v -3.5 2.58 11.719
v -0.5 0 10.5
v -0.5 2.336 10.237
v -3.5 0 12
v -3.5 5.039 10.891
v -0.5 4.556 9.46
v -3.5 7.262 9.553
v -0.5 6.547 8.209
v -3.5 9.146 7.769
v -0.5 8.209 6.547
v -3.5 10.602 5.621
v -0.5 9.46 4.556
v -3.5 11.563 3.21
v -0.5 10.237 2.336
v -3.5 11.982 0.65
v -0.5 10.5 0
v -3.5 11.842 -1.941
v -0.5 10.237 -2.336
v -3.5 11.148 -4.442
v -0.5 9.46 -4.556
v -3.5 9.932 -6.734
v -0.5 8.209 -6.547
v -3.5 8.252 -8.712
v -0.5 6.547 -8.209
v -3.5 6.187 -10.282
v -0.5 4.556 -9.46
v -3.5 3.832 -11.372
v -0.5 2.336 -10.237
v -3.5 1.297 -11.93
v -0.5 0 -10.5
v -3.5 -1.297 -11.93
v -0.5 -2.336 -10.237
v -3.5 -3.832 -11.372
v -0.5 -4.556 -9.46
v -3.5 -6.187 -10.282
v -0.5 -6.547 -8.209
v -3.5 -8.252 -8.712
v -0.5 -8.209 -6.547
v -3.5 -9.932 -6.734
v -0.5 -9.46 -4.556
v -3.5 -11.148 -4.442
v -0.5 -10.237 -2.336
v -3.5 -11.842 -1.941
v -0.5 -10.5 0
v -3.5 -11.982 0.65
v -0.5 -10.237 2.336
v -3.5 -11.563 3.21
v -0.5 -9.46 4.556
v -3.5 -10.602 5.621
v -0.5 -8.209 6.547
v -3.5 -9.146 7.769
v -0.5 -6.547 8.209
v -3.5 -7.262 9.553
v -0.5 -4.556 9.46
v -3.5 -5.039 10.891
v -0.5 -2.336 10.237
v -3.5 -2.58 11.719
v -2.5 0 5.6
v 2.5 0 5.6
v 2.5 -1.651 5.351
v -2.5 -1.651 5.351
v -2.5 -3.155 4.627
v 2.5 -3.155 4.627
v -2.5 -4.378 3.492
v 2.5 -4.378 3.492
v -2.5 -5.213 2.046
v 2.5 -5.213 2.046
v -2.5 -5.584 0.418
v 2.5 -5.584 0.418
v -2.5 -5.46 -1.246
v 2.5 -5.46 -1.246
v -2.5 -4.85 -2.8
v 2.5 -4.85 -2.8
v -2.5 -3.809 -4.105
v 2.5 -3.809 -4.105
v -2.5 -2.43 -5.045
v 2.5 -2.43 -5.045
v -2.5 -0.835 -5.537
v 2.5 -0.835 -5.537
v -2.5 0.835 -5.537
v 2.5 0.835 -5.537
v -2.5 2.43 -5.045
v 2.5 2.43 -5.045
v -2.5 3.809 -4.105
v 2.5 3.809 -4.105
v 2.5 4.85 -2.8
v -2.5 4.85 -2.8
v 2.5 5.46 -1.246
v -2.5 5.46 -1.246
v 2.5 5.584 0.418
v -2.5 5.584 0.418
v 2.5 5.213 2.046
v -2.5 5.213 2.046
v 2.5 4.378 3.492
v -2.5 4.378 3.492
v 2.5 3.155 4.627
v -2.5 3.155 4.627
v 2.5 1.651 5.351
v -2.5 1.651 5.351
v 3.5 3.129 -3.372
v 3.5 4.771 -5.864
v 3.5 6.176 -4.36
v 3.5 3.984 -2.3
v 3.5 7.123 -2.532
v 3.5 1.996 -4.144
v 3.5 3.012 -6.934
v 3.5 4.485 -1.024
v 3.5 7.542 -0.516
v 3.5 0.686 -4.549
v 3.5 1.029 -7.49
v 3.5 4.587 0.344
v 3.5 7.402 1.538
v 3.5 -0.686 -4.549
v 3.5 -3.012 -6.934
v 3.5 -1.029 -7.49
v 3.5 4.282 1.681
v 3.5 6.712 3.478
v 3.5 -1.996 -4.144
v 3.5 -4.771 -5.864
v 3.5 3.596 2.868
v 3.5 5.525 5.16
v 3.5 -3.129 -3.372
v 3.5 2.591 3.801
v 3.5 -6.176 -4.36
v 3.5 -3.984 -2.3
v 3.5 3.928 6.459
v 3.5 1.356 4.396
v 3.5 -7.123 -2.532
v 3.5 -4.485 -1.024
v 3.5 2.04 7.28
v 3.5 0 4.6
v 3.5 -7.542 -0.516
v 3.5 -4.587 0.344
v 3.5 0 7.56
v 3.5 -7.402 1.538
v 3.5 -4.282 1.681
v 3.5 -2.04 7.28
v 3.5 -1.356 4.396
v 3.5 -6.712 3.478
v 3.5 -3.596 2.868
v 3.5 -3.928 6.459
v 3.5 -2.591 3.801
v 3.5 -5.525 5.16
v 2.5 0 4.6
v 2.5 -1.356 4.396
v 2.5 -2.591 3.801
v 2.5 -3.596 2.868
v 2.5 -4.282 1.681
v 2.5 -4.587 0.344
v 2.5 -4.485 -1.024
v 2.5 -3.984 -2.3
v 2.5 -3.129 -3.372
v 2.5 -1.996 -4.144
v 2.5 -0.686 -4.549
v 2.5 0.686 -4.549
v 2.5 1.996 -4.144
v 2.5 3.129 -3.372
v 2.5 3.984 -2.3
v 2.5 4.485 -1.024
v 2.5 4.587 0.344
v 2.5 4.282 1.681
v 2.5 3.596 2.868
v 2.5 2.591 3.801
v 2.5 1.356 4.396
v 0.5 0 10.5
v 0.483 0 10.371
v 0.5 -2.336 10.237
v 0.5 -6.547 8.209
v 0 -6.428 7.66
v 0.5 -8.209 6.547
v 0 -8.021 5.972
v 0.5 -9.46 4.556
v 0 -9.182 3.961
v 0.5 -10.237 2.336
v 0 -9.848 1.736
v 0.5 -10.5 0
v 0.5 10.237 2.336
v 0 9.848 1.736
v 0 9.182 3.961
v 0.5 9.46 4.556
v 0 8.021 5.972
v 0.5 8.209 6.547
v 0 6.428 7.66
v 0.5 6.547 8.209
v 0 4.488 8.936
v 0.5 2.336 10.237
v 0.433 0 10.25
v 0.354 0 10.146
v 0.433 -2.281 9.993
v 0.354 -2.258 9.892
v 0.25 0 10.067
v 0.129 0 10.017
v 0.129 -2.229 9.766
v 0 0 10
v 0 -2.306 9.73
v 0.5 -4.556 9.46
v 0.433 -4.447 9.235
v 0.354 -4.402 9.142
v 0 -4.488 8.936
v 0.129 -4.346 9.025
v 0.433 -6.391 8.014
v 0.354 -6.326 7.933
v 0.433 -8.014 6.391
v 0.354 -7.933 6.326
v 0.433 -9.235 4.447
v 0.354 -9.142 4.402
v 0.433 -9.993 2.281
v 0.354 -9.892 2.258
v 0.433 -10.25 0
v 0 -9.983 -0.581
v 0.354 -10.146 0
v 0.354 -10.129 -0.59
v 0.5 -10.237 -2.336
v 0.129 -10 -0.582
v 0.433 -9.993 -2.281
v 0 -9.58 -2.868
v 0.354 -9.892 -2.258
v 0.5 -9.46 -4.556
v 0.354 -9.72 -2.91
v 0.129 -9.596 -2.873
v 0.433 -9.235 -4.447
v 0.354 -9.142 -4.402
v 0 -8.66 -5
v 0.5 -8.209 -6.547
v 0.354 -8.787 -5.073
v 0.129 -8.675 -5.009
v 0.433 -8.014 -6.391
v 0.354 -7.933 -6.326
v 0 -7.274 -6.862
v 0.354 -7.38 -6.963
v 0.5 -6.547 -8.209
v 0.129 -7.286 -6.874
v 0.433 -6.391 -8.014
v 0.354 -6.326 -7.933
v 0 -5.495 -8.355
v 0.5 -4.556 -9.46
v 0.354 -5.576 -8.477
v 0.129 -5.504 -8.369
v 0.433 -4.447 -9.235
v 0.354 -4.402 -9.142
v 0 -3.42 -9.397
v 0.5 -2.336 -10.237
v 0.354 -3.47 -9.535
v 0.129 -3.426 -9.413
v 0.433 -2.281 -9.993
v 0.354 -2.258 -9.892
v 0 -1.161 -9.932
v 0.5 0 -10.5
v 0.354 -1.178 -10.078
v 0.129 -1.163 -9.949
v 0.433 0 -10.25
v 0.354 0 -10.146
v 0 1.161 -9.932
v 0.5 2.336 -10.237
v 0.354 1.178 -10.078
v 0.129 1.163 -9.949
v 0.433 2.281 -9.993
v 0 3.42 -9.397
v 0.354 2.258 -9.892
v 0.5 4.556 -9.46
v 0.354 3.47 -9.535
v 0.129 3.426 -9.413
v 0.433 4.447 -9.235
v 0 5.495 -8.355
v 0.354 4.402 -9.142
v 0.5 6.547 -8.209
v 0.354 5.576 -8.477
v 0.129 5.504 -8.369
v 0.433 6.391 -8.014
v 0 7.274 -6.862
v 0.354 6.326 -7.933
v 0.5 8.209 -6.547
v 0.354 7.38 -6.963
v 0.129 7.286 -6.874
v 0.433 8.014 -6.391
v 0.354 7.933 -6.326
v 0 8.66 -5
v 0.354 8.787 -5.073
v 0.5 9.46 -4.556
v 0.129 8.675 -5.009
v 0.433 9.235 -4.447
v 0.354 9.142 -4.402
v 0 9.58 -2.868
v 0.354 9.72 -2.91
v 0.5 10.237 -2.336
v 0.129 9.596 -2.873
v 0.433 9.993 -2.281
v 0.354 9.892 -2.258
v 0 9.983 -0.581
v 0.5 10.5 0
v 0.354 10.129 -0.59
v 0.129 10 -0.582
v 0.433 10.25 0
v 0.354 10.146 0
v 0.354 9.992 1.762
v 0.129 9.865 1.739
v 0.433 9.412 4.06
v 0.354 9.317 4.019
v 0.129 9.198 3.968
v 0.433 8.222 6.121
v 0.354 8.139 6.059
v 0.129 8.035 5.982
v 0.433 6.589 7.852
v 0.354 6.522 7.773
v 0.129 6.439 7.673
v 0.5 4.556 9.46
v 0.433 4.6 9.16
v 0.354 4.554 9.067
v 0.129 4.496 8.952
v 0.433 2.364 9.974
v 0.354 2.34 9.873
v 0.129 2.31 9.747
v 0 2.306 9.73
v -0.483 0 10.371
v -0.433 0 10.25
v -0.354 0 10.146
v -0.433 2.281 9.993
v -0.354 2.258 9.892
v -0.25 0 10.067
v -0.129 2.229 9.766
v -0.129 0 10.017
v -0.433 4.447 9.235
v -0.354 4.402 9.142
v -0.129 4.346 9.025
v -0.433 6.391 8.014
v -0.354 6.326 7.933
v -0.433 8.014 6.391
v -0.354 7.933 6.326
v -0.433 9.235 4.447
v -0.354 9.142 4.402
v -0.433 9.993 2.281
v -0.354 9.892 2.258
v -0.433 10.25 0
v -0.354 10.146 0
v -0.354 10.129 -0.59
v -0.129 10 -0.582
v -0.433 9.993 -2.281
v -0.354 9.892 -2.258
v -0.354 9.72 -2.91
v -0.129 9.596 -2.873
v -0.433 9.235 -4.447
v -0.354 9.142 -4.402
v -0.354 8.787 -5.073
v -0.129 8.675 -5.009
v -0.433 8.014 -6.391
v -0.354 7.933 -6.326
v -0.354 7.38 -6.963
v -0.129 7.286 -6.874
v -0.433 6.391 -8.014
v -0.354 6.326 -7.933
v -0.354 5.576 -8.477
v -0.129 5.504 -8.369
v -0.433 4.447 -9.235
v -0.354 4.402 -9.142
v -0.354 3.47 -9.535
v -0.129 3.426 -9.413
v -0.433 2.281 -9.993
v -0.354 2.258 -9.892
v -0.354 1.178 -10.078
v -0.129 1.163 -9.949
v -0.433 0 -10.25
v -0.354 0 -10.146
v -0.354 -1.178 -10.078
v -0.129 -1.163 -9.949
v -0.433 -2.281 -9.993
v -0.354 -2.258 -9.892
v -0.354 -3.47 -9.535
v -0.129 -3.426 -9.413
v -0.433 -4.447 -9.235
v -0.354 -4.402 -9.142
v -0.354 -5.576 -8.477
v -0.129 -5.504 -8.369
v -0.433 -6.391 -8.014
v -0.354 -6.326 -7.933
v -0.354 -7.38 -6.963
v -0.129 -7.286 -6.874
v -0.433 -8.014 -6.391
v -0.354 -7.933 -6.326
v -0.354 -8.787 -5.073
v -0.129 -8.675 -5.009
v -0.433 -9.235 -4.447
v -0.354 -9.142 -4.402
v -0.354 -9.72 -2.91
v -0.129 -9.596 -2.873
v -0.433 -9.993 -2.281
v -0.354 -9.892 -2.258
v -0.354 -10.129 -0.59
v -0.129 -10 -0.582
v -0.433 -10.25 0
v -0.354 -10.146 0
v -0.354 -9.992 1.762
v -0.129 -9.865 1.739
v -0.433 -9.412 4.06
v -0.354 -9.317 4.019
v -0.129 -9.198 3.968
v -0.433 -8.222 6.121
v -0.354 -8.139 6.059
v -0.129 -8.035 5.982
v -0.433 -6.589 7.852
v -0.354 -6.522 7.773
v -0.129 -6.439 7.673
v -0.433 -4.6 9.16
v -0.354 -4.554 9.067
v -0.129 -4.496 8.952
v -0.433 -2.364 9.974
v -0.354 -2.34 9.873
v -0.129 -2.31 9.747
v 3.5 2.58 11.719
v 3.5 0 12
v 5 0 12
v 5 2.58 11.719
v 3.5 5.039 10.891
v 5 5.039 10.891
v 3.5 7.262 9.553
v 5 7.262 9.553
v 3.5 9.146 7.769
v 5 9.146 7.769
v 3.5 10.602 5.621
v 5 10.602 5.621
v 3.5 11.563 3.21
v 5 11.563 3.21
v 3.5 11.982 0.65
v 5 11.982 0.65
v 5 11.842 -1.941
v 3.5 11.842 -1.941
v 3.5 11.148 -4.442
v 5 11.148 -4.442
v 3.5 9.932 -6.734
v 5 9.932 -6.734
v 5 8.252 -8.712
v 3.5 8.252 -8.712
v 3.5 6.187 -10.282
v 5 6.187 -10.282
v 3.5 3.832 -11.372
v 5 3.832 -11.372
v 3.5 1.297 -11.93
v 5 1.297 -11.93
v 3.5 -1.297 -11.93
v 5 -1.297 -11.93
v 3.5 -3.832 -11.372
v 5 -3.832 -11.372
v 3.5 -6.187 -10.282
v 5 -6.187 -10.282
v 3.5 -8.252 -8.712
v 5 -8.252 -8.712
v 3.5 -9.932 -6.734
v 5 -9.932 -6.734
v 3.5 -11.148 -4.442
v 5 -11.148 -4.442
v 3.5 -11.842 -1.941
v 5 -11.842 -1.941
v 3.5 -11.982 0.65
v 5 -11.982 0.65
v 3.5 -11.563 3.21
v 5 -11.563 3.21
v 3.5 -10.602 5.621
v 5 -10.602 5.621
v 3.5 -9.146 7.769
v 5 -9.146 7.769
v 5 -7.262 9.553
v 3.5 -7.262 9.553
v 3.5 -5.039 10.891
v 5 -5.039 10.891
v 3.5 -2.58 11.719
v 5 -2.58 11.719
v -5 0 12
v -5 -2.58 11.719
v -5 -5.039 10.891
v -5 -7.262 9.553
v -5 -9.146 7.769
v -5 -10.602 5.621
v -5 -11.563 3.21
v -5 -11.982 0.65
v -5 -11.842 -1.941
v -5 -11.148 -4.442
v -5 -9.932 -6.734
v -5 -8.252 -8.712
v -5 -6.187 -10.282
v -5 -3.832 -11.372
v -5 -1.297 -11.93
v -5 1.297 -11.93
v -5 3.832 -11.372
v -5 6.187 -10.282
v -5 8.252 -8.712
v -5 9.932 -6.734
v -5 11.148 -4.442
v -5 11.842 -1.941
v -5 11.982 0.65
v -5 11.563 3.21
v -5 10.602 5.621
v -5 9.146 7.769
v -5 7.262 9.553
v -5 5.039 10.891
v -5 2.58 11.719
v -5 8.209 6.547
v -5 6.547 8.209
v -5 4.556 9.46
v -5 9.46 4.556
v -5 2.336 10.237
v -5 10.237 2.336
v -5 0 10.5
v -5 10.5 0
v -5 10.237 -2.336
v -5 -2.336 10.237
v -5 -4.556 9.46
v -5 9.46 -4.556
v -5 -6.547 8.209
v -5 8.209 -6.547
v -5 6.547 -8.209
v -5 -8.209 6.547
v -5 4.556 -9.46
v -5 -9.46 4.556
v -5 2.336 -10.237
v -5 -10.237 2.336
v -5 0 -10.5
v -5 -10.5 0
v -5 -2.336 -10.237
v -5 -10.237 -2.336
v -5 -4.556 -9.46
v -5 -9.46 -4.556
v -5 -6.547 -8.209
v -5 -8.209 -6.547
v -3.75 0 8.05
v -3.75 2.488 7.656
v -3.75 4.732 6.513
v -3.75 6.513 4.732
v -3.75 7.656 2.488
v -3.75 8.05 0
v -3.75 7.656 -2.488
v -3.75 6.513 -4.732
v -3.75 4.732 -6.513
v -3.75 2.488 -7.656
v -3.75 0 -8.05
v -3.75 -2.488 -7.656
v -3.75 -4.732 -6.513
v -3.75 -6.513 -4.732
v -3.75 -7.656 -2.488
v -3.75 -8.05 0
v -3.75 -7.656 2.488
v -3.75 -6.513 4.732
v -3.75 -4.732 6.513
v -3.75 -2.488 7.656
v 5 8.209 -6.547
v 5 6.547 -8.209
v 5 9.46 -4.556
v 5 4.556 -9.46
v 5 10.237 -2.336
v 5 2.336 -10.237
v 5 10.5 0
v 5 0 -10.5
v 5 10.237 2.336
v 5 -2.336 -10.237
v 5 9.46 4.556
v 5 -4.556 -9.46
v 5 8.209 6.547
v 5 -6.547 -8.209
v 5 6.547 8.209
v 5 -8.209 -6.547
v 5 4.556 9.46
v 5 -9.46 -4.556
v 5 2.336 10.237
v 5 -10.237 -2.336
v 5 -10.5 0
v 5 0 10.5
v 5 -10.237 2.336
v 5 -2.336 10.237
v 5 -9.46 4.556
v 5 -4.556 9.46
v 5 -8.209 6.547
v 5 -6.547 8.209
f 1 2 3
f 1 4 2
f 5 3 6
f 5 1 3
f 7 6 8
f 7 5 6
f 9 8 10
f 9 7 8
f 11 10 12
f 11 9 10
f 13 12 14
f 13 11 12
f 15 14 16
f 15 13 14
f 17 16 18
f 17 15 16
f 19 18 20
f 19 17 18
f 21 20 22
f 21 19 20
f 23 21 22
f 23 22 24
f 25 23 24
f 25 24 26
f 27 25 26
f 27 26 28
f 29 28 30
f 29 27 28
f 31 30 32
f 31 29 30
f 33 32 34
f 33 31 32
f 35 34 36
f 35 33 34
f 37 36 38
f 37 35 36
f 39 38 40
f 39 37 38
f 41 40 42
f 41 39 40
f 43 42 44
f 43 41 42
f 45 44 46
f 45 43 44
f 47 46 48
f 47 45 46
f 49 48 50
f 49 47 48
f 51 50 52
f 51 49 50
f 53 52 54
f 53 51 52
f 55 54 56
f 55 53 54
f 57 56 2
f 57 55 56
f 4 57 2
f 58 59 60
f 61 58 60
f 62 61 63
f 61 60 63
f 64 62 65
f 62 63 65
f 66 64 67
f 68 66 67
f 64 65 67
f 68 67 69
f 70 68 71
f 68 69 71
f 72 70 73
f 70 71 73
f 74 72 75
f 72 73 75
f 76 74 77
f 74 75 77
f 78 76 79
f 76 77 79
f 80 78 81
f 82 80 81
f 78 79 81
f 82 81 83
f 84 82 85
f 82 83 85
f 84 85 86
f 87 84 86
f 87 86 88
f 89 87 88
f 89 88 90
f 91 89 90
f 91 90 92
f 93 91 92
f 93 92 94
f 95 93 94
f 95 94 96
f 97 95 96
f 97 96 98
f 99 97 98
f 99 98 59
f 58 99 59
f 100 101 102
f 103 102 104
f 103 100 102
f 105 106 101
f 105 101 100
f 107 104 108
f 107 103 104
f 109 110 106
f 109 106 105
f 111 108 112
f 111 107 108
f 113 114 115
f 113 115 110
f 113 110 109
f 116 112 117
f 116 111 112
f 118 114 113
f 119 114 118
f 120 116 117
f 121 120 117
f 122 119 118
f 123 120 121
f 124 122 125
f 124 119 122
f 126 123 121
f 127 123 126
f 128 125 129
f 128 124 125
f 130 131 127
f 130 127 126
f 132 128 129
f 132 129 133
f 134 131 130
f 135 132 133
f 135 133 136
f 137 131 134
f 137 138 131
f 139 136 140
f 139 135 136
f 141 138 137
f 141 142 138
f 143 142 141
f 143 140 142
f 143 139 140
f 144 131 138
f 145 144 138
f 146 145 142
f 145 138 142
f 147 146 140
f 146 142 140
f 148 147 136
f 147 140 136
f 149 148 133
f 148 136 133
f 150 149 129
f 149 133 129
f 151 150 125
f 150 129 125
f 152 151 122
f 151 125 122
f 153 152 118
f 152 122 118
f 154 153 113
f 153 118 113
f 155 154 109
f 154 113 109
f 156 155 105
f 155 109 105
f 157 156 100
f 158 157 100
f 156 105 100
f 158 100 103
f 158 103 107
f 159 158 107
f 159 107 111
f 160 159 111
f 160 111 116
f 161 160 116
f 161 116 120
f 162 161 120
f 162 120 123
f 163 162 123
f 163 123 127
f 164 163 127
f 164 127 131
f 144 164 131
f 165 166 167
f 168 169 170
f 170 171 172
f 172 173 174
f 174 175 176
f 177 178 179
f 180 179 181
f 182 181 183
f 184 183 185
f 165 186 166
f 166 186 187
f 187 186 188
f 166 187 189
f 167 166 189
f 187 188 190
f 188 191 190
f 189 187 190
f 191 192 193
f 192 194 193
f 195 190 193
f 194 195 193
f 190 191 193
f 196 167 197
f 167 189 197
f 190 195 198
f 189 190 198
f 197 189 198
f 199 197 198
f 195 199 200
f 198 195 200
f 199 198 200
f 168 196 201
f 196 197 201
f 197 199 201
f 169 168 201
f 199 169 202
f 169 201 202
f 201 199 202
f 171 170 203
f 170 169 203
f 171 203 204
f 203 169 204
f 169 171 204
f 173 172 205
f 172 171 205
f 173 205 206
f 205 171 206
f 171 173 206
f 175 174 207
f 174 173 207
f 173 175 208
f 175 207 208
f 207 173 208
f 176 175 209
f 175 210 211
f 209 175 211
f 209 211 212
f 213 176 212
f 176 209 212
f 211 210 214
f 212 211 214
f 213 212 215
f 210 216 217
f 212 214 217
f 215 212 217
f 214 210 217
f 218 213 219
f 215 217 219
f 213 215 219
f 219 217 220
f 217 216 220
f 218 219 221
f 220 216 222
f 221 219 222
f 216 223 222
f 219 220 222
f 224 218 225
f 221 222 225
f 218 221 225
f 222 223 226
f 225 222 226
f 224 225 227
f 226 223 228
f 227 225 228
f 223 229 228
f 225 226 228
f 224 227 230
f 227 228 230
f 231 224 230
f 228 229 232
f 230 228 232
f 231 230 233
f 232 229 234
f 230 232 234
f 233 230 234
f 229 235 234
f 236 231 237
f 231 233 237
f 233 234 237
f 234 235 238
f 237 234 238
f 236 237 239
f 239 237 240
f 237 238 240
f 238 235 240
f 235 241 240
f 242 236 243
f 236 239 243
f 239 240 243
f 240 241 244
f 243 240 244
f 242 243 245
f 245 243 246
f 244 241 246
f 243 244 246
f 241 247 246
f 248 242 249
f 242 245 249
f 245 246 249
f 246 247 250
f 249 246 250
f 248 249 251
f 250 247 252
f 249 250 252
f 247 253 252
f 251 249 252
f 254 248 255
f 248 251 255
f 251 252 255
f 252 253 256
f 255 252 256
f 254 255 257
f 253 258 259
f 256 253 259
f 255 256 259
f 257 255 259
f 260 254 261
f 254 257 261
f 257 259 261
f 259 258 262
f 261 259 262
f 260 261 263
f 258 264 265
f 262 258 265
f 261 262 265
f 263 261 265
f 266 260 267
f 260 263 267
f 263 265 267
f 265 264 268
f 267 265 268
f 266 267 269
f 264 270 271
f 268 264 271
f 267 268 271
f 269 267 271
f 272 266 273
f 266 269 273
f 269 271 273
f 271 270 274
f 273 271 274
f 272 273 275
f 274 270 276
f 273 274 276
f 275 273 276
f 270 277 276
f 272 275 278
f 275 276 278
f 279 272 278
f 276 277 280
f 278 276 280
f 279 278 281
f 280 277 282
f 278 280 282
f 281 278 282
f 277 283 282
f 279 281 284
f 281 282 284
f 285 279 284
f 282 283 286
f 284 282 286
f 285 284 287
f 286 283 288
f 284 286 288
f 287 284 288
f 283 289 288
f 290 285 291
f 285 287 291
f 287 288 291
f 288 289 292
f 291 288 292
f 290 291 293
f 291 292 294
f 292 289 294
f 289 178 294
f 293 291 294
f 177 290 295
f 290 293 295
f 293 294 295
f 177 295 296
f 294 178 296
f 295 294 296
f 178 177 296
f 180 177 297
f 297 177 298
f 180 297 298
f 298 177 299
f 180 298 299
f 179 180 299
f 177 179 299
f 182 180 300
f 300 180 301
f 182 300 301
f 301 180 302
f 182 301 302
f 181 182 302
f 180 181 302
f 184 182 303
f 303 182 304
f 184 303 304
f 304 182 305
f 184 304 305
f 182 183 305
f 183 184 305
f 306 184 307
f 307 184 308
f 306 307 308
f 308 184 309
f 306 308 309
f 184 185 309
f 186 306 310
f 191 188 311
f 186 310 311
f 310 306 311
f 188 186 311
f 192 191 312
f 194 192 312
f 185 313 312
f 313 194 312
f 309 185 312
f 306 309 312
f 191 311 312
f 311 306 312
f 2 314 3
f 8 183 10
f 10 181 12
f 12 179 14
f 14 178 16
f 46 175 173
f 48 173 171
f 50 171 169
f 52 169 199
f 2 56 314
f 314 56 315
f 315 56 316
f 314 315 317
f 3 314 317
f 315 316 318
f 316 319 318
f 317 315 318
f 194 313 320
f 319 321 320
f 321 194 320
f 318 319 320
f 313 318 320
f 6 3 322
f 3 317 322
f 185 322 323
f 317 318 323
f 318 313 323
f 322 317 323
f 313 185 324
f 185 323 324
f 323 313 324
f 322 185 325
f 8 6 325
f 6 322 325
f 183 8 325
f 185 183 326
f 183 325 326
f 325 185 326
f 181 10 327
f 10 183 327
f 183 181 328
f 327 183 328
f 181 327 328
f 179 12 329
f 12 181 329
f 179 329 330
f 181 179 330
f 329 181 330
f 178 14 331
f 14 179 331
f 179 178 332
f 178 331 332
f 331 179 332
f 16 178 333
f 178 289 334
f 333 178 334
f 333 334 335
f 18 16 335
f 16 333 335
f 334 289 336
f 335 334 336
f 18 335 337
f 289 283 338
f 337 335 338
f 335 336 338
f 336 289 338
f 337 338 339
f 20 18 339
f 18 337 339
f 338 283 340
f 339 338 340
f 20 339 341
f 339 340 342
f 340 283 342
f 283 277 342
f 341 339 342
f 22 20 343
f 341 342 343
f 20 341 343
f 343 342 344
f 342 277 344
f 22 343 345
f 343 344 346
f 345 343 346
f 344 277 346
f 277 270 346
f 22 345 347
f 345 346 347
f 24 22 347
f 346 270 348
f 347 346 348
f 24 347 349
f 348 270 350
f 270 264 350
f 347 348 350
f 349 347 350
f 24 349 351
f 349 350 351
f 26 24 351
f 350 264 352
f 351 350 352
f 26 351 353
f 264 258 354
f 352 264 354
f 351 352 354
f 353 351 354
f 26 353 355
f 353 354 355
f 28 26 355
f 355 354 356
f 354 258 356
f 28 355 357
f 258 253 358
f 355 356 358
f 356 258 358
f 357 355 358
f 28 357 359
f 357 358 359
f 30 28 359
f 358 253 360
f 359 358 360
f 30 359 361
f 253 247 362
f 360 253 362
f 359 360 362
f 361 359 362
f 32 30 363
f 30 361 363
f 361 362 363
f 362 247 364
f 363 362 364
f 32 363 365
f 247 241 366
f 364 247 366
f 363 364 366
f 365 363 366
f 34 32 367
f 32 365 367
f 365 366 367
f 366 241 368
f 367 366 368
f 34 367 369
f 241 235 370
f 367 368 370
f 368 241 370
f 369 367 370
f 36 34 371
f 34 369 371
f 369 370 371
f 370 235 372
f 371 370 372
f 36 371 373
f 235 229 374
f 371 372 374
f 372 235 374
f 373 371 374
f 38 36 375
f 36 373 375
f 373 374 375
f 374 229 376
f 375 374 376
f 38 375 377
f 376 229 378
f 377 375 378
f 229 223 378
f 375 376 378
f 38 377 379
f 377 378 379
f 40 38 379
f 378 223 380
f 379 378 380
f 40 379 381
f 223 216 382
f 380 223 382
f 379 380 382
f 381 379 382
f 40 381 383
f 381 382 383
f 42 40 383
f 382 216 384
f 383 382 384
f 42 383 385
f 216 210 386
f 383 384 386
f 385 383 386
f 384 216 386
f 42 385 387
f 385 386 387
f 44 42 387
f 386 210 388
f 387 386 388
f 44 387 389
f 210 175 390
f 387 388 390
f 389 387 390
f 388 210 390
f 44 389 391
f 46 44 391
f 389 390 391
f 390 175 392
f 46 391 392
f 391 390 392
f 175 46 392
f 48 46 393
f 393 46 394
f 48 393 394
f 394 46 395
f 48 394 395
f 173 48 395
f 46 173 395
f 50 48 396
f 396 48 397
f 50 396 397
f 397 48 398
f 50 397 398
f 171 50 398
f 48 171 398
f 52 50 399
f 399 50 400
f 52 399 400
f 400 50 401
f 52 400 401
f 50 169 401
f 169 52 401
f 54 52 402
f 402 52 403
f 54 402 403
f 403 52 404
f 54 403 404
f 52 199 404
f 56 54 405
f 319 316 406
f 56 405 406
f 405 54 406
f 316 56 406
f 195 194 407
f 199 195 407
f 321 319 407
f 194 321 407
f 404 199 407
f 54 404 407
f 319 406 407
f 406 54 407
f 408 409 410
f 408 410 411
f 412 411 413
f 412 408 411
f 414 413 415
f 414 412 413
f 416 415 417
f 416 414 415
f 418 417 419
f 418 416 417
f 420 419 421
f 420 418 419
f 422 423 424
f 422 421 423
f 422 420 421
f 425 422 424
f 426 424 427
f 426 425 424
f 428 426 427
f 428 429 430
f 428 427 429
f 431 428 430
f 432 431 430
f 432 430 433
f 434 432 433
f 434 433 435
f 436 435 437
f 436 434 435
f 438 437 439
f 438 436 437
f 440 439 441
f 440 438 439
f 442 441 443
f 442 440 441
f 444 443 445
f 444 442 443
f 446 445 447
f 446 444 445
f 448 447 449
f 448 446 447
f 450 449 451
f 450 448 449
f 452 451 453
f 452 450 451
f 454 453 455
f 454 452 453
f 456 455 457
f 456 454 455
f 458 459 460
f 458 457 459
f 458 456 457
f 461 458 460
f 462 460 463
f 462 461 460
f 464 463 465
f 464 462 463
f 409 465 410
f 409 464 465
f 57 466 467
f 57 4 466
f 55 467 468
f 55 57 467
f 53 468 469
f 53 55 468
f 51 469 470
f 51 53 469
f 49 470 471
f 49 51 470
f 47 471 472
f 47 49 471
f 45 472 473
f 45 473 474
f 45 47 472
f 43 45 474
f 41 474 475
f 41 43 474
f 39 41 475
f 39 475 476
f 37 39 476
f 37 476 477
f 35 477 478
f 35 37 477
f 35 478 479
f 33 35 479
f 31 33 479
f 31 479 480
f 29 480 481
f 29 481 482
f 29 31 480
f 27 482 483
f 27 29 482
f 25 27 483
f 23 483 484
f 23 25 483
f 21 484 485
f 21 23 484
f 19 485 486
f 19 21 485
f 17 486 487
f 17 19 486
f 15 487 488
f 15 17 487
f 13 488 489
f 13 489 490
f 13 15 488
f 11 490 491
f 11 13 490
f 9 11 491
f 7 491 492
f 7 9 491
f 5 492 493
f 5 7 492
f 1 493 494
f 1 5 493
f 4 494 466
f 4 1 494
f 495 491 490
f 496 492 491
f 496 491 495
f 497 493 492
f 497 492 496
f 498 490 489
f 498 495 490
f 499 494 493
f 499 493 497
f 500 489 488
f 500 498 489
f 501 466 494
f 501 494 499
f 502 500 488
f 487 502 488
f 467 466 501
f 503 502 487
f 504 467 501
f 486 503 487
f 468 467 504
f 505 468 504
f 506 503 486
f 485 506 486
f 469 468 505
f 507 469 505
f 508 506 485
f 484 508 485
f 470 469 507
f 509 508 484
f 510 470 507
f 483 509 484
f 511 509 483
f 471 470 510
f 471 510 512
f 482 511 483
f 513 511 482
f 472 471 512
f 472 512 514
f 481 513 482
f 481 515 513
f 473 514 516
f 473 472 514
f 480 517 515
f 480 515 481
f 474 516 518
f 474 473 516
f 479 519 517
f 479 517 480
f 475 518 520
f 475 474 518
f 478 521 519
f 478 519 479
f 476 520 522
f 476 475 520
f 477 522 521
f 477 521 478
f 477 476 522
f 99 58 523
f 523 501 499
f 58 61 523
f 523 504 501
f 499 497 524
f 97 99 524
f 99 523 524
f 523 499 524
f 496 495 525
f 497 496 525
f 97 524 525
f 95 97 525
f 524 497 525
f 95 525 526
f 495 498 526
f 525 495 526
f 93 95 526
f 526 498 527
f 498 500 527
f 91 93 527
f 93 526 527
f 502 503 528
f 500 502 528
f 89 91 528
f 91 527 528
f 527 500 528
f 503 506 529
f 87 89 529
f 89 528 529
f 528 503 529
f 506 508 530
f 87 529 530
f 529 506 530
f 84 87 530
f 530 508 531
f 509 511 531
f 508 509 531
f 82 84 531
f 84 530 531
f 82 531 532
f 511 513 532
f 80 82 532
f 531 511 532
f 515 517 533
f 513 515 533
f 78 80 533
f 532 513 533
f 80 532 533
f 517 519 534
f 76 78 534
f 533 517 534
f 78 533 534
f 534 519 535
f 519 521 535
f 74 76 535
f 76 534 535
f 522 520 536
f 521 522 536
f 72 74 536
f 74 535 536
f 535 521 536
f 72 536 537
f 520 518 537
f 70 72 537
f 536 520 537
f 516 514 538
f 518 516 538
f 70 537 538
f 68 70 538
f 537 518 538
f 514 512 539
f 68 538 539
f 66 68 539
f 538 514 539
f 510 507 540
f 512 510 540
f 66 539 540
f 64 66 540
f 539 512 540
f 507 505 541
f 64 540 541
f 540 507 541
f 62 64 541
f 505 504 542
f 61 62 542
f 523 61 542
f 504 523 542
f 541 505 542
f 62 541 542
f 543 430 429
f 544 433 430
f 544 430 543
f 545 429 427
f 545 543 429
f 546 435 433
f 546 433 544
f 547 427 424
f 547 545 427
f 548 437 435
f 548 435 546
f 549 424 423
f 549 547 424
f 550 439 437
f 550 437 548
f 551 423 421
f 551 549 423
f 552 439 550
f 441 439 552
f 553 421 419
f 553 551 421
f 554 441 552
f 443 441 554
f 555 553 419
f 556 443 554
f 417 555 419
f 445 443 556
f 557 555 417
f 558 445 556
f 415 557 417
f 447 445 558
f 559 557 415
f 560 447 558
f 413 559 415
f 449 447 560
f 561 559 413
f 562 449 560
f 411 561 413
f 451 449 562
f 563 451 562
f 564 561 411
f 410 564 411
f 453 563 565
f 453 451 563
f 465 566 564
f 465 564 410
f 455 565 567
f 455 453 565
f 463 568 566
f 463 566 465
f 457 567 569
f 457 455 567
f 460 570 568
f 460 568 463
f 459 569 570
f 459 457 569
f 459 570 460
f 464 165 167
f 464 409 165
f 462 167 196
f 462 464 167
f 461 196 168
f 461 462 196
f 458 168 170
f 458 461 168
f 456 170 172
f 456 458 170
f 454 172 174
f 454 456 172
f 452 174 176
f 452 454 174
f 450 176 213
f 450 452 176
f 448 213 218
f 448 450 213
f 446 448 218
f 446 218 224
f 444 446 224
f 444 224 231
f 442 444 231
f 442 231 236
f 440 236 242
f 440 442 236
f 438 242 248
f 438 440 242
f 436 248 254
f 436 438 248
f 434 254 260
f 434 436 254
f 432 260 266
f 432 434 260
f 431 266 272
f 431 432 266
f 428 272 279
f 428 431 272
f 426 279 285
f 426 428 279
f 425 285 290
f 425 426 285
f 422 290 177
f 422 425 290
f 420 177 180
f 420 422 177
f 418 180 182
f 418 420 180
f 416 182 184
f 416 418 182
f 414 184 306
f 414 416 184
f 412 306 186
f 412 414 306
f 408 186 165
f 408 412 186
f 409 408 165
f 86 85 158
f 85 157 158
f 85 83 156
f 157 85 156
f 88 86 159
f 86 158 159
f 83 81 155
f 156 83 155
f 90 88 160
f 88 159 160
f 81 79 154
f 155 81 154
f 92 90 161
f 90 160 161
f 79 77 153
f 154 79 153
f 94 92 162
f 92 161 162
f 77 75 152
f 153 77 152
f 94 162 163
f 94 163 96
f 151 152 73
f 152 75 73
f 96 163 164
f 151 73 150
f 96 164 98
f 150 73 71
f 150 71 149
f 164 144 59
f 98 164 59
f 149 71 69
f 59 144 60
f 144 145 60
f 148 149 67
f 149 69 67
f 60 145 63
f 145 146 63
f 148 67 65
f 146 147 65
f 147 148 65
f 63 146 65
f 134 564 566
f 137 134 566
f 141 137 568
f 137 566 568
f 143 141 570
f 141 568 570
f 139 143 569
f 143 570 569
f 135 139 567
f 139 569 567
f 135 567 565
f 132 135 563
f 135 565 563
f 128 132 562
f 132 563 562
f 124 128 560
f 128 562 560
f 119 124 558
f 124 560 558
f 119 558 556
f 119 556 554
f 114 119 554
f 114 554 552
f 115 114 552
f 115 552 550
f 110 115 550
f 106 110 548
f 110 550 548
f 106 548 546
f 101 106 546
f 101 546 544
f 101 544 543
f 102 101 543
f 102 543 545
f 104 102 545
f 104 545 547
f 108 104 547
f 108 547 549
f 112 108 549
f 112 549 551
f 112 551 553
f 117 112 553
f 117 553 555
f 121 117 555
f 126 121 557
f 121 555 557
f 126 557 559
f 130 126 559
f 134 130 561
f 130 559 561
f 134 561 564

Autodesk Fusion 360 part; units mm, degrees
sketch "Sketch1" plane through (0, 0, 0) normal (0, 1, 0) x (1, 0, 0)
  line L0 (0, 0) -> (5, 0)
  line L1 (5, 0) -> (5, -10.5)
  line L2 (5, -10.5) -> (0, -10.5)
  line L3 (0, -10.5) -> (0, 0)
  line L4 (5, -10.5) -> (5, -12)
  line L5 (5, -12) -> (3.5, -12)
  circle A0 centre (0, -10.5) radius 0.5
  line L6 (3.5, -12) -> (0.5, -10.5)
  line L7 (0, 0) -> (0, -5.6)
  line L8 (0, -5.6) -> (2.5, -5.6)
  line L9 (2.5, -5.6) -> (5, -10.5)
  point P0 (0, -10)
  dimension "d1" = 5
  dimension "d2" = 10.5
  dimension "d3" = 1
  dimension "d7" = 1.5
  dimension "d8" = 1.5
  dimension "d9" = 5.6
  dimension "d10" = 2.5
revolve "Revolve1" add sketch "Sketch1" angle 360 about axis through (1.75, 0, 0) along (1, 0, 0) contours L2 L3 A0 L8 L9 | L2 L4 L5 L6
mirror "Mirror1" about plane through (0, 0, 0) normal (1, 0, 0) of bodies 1 merged
sketch "Sketch2" plane through (0, 0, 0) normal (0, 1, 0) x (1, 0, 0)
  line L0 (0, 0) -> (5, 0)
  line L1 (5, 0) -> (5, -10.5)
  line L2 (2.5, 0) -> (2.5, -5.6)
  line L3 (5, -10.5) -> (2.5, -5.6)
  line L4 (3.5, 0) -> (3.5, -7.56)
  line L5 (2.5, -4.6) -> (3.5, -4.6)
  dimension "d11" = 10.5
  dimension "d12" = 5.6
  dimension "d13" = 1
  dimension "d14" = 1
revolve "Revolve2" add sketch "Sketch2" angle 360 about axis through (0, 0, 0) along (1, 0, 0) contours L2 L3 L4 L5
